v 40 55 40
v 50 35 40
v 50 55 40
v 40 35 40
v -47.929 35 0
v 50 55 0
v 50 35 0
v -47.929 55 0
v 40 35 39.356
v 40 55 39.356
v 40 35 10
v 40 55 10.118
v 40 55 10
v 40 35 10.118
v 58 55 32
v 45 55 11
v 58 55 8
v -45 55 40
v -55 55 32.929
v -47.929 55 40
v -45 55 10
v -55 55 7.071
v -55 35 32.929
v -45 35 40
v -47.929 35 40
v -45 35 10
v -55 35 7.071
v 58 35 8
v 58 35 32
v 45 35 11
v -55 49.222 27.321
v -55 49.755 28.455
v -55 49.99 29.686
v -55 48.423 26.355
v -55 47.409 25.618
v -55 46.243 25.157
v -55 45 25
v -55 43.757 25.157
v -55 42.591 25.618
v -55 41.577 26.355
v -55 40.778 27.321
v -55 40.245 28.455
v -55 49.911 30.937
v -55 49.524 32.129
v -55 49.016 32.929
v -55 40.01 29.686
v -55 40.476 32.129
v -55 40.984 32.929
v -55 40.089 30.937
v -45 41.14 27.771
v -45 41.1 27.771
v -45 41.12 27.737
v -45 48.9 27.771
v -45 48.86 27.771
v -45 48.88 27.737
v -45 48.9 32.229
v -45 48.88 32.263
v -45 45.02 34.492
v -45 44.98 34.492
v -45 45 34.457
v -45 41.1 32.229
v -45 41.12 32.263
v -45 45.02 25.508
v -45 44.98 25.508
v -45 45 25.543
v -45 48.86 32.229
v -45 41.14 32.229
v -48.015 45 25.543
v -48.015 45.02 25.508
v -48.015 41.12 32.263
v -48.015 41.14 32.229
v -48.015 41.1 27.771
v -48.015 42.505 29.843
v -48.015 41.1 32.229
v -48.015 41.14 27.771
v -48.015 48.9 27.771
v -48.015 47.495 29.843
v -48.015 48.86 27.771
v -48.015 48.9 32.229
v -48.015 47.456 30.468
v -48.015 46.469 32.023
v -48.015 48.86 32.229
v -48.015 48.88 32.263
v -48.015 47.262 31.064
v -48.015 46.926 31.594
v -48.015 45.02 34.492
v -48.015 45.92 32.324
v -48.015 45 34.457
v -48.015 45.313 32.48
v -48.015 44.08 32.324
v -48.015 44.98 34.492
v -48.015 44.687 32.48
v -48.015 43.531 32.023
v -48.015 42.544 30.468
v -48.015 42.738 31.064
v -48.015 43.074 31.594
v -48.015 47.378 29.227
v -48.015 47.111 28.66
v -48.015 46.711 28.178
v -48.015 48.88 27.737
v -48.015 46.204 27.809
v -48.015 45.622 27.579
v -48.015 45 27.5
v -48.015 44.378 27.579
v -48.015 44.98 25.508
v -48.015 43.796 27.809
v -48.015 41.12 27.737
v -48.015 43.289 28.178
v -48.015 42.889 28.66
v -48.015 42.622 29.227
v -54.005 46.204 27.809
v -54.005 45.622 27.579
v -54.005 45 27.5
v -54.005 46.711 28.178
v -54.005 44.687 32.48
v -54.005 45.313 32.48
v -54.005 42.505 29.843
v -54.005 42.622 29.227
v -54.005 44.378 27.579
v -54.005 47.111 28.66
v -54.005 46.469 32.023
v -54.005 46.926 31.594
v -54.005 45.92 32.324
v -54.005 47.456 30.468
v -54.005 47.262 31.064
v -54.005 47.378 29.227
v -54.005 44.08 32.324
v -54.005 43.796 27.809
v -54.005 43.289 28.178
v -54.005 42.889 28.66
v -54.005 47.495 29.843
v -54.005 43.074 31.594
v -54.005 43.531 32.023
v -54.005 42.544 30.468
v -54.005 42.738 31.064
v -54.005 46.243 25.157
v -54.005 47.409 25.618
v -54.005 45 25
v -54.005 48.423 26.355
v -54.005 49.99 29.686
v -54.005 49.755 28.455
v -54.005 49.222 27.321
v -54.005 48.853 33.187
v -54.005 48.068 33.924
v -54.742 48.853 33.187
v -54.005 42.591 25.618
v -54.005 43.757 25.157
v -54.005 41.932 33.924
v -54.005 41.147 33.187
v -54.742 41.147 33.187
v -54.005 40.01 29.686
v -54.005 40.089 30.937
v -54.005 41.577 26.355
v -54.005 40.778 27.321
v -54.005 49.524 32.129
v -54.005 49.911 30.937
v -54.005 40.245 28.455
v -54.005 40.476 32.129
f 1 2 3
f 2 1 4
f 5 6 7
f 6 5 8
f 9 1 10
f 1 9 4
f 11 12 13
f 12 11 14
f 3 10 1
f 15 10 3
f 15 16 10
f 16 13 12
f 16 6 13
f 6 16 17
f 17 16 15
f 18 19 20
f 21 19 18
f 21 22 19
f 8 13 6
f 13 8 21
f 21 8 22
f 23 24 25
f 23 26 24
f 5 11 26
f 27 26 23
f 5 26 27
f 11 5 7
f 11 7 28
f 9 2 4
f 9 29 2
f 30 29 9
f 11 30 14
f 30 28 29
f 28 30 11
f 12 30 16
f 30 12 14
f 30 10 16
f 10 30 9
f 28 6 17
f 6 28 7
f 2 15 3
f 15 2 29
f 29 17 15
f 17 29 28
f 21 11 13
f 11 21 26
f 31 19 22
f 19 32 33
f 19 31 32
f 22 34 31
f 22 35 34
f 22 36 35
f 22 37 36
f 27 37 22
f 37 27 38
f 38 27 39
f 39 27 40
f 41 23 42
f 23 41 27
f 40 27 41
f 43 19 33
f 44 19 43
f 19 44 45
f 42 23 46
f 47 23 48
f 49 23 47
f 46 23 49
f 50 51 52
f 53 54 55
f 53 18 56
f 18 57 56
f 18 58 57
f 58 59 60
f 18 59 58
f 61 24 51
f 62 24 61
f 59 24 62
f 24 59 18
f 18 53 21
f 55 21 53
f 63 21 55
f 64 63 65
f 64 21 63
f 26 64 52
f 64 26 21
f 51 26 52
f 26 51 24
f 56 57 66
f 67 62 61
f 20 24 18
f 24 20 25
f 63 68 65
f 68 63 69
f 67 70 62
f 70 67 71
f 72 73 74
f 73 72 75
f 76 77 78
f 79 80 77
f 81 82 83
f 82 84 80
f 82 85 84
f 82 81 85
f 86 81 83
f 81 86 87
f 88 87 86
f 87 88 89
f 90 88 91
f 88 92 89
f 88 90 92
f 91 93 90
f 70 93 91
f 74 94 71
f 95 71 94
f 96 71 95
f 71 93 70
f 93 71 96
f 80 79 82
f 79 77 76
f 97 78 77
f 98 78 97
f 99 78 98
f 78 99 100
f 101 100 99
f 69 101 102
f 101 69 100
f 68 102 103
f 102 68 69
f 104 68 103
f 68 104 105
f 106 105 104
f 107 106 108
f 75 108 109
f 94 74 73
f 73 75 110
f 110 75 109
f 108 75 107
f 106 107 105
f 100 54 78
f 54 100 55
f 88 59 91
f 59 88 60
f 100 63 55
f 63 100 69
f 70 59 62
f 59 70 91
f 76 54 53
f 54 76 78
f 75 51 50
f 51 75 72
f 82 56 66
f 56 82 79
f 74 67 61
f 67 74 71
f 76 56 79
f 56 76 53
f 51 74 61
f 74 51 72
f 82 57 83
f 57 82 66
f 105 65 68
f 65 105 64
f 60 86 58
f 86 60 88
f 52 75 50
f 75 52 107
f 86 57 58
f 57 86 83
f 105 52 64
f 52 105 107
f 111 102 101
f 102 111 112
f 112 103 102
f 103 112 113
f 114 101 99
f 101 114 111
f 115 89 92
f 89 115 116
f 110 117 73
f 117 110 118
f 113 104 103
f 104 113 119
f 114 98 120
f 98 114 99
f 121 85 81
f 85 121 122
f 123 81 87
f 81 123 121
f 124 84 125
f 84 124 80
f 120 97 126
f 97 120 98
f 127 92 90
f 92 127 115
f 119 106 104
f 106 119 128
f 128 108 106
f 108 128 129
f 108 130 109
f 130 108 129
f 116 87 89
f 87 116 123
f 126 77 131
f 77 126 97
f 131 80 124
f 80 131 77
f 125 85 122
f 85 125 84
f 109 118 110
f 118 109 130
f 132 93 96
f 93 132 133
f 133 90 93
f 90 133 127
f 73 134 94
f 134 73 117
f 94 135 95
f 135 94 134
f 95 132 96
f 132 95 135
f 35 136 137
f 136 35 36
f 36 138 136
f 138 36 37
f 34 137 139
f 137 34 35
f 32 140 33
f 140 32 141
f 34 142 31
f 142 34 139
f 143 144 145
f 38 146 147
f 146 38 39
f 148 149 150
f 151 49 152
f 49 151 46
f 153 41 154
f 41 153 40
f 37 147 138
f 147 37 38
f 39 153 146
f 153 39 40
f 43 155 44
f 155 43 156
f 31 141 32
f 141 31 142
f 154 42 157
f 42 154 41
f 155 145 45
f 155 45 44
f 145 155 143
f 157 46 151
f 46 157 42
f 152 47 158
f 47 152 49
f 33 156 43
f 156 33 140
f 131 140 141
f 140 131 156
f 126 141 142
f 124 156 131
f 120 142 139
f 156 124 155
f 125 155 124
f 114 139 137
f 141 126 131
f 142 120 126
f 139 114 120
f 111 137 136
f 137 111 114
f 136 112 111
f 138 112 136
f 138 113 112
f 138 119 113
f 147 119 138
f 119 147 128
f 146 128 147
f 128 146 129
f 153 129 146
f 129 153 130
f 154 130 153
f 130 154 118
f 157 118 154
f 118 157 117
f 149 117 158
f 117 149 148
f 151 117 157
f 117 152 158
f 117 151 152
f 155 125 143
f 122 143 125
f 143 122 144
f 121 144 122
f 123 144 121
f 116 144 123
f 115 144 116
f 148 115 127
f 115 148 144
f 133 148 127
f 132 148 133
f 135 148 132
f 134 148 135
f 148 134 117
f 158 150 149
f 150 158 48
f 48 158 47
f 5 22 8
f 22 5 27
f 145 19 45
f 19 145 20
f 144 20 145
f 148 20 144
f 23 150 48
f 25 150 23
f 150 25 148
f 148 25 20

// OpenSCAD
eps = 0.01;

module clamp(l=90, w=20, h=10, d1=40, o=10, hdia1=5, hdia2=10, hd=1, nw=7.8, nd=3, notch_sf=0.75, notch_d=5, notch_a=10, notch_o=1, edge_a=10, edge_d=22) {
    translate([-h-l/2, -w/2, 0]) union() {
        translate([l+h-notch_d, 0, 0]) intersection() {
            difference() {
                cube([d1, w, d1]);
                //scale([notch_sf, 1, 1]) translate([(d1-h)/2, 0, h+(d1-h)/2]) rotate([0, -135, 0]) translate([0, -eps/2, 0]) cube([d1, w+eps, d1]);
                translate([notch_d, 0, h+notch_o]) mirror([1, 0, 0]) rotate([0, notch_a, 0]) translate([0, -eps/2, 0]) cube([d1, w+eps, d1]);
            }
            translate([d1-edge_a, 0, d1/2]) rotate([0, -90-45, 0]) cube([2*d1, w+eps, 2*d1]);
            translate([-d1-edge_d, 0]) cube([2*d1, w+eps, 2*d1]);
        }
        difference() {
            union() {
                cube ([l+h, w, h]);
                cube ([h, w, d1]);
            }
            rotate([0, 45, 0]) translate([-l/2, -eps/2, -d1/8*7]) cube([l, w+eps, d1]);
            translate([0, 0, d1]) rotate([0, 90+45, 0]) translate([-l/2, -eps/2, -d1/8*7]) cube([l, w+eps, d1]);
            translate([-eps/2, w/2, d1-o]) rotate([0, 90, 0]) union() {
                cylinder(d=hdia1, h=l);
                cylinder(d=hdia2, h=hd);
                translate([0, 0, h-nd/2]) hexagon(nw, nd+2*eps);
            }
        }
    }
}

module hexagon(size, height) {
  boxWidth = size/1.75;
  for (r = [-60, 0, 60]) rotate([0,0,r]) cube([boxWidth, size, height], true);
}

nut_dia = 5.3;
nut_depth=5.5;
nut_off_y = 80/2;
nut_off_x = 20;

module base($fn=25, cw=90, sw=15, sh=10, strut_spacing=30, clamp_dist=90) {
    difference() {
        translate([0, -clamp_dist/2, 0]) union() {
            translate([0,  clamp_dist, 0]) clamp(l=cw, h=sh);
            /*
            translate([0,    0, 0]) clamp(l=cw, h=sh);
            translate([-strut_spacing/2-sw, 0, 0]) cube([sw, clamp_dist, sh]);
            translate([ strut_spacing/2, 0, 0]) cube([sw, clamp_dist, sh]);
            */
        }
        /*
        translate([nut_off_x, nut_off_y, -eps]) cylinder(d=nut_dia, h=nut_depth+eps);
        translate([nut_off_x, -nut_off_y, -eps]) cylinder(d=nut_dia, h=nut_depth+eps);
        translate([-nut_off_x, nut_off_y, -eps]) cylinder(d=nut_dia, h=nut_depth+eps);
        translate([-nut_off_x, -nut_off_y, -eps]) cylinder(d=nut_dia, h=nut_depth+eps);
        */
    }
}

base();
